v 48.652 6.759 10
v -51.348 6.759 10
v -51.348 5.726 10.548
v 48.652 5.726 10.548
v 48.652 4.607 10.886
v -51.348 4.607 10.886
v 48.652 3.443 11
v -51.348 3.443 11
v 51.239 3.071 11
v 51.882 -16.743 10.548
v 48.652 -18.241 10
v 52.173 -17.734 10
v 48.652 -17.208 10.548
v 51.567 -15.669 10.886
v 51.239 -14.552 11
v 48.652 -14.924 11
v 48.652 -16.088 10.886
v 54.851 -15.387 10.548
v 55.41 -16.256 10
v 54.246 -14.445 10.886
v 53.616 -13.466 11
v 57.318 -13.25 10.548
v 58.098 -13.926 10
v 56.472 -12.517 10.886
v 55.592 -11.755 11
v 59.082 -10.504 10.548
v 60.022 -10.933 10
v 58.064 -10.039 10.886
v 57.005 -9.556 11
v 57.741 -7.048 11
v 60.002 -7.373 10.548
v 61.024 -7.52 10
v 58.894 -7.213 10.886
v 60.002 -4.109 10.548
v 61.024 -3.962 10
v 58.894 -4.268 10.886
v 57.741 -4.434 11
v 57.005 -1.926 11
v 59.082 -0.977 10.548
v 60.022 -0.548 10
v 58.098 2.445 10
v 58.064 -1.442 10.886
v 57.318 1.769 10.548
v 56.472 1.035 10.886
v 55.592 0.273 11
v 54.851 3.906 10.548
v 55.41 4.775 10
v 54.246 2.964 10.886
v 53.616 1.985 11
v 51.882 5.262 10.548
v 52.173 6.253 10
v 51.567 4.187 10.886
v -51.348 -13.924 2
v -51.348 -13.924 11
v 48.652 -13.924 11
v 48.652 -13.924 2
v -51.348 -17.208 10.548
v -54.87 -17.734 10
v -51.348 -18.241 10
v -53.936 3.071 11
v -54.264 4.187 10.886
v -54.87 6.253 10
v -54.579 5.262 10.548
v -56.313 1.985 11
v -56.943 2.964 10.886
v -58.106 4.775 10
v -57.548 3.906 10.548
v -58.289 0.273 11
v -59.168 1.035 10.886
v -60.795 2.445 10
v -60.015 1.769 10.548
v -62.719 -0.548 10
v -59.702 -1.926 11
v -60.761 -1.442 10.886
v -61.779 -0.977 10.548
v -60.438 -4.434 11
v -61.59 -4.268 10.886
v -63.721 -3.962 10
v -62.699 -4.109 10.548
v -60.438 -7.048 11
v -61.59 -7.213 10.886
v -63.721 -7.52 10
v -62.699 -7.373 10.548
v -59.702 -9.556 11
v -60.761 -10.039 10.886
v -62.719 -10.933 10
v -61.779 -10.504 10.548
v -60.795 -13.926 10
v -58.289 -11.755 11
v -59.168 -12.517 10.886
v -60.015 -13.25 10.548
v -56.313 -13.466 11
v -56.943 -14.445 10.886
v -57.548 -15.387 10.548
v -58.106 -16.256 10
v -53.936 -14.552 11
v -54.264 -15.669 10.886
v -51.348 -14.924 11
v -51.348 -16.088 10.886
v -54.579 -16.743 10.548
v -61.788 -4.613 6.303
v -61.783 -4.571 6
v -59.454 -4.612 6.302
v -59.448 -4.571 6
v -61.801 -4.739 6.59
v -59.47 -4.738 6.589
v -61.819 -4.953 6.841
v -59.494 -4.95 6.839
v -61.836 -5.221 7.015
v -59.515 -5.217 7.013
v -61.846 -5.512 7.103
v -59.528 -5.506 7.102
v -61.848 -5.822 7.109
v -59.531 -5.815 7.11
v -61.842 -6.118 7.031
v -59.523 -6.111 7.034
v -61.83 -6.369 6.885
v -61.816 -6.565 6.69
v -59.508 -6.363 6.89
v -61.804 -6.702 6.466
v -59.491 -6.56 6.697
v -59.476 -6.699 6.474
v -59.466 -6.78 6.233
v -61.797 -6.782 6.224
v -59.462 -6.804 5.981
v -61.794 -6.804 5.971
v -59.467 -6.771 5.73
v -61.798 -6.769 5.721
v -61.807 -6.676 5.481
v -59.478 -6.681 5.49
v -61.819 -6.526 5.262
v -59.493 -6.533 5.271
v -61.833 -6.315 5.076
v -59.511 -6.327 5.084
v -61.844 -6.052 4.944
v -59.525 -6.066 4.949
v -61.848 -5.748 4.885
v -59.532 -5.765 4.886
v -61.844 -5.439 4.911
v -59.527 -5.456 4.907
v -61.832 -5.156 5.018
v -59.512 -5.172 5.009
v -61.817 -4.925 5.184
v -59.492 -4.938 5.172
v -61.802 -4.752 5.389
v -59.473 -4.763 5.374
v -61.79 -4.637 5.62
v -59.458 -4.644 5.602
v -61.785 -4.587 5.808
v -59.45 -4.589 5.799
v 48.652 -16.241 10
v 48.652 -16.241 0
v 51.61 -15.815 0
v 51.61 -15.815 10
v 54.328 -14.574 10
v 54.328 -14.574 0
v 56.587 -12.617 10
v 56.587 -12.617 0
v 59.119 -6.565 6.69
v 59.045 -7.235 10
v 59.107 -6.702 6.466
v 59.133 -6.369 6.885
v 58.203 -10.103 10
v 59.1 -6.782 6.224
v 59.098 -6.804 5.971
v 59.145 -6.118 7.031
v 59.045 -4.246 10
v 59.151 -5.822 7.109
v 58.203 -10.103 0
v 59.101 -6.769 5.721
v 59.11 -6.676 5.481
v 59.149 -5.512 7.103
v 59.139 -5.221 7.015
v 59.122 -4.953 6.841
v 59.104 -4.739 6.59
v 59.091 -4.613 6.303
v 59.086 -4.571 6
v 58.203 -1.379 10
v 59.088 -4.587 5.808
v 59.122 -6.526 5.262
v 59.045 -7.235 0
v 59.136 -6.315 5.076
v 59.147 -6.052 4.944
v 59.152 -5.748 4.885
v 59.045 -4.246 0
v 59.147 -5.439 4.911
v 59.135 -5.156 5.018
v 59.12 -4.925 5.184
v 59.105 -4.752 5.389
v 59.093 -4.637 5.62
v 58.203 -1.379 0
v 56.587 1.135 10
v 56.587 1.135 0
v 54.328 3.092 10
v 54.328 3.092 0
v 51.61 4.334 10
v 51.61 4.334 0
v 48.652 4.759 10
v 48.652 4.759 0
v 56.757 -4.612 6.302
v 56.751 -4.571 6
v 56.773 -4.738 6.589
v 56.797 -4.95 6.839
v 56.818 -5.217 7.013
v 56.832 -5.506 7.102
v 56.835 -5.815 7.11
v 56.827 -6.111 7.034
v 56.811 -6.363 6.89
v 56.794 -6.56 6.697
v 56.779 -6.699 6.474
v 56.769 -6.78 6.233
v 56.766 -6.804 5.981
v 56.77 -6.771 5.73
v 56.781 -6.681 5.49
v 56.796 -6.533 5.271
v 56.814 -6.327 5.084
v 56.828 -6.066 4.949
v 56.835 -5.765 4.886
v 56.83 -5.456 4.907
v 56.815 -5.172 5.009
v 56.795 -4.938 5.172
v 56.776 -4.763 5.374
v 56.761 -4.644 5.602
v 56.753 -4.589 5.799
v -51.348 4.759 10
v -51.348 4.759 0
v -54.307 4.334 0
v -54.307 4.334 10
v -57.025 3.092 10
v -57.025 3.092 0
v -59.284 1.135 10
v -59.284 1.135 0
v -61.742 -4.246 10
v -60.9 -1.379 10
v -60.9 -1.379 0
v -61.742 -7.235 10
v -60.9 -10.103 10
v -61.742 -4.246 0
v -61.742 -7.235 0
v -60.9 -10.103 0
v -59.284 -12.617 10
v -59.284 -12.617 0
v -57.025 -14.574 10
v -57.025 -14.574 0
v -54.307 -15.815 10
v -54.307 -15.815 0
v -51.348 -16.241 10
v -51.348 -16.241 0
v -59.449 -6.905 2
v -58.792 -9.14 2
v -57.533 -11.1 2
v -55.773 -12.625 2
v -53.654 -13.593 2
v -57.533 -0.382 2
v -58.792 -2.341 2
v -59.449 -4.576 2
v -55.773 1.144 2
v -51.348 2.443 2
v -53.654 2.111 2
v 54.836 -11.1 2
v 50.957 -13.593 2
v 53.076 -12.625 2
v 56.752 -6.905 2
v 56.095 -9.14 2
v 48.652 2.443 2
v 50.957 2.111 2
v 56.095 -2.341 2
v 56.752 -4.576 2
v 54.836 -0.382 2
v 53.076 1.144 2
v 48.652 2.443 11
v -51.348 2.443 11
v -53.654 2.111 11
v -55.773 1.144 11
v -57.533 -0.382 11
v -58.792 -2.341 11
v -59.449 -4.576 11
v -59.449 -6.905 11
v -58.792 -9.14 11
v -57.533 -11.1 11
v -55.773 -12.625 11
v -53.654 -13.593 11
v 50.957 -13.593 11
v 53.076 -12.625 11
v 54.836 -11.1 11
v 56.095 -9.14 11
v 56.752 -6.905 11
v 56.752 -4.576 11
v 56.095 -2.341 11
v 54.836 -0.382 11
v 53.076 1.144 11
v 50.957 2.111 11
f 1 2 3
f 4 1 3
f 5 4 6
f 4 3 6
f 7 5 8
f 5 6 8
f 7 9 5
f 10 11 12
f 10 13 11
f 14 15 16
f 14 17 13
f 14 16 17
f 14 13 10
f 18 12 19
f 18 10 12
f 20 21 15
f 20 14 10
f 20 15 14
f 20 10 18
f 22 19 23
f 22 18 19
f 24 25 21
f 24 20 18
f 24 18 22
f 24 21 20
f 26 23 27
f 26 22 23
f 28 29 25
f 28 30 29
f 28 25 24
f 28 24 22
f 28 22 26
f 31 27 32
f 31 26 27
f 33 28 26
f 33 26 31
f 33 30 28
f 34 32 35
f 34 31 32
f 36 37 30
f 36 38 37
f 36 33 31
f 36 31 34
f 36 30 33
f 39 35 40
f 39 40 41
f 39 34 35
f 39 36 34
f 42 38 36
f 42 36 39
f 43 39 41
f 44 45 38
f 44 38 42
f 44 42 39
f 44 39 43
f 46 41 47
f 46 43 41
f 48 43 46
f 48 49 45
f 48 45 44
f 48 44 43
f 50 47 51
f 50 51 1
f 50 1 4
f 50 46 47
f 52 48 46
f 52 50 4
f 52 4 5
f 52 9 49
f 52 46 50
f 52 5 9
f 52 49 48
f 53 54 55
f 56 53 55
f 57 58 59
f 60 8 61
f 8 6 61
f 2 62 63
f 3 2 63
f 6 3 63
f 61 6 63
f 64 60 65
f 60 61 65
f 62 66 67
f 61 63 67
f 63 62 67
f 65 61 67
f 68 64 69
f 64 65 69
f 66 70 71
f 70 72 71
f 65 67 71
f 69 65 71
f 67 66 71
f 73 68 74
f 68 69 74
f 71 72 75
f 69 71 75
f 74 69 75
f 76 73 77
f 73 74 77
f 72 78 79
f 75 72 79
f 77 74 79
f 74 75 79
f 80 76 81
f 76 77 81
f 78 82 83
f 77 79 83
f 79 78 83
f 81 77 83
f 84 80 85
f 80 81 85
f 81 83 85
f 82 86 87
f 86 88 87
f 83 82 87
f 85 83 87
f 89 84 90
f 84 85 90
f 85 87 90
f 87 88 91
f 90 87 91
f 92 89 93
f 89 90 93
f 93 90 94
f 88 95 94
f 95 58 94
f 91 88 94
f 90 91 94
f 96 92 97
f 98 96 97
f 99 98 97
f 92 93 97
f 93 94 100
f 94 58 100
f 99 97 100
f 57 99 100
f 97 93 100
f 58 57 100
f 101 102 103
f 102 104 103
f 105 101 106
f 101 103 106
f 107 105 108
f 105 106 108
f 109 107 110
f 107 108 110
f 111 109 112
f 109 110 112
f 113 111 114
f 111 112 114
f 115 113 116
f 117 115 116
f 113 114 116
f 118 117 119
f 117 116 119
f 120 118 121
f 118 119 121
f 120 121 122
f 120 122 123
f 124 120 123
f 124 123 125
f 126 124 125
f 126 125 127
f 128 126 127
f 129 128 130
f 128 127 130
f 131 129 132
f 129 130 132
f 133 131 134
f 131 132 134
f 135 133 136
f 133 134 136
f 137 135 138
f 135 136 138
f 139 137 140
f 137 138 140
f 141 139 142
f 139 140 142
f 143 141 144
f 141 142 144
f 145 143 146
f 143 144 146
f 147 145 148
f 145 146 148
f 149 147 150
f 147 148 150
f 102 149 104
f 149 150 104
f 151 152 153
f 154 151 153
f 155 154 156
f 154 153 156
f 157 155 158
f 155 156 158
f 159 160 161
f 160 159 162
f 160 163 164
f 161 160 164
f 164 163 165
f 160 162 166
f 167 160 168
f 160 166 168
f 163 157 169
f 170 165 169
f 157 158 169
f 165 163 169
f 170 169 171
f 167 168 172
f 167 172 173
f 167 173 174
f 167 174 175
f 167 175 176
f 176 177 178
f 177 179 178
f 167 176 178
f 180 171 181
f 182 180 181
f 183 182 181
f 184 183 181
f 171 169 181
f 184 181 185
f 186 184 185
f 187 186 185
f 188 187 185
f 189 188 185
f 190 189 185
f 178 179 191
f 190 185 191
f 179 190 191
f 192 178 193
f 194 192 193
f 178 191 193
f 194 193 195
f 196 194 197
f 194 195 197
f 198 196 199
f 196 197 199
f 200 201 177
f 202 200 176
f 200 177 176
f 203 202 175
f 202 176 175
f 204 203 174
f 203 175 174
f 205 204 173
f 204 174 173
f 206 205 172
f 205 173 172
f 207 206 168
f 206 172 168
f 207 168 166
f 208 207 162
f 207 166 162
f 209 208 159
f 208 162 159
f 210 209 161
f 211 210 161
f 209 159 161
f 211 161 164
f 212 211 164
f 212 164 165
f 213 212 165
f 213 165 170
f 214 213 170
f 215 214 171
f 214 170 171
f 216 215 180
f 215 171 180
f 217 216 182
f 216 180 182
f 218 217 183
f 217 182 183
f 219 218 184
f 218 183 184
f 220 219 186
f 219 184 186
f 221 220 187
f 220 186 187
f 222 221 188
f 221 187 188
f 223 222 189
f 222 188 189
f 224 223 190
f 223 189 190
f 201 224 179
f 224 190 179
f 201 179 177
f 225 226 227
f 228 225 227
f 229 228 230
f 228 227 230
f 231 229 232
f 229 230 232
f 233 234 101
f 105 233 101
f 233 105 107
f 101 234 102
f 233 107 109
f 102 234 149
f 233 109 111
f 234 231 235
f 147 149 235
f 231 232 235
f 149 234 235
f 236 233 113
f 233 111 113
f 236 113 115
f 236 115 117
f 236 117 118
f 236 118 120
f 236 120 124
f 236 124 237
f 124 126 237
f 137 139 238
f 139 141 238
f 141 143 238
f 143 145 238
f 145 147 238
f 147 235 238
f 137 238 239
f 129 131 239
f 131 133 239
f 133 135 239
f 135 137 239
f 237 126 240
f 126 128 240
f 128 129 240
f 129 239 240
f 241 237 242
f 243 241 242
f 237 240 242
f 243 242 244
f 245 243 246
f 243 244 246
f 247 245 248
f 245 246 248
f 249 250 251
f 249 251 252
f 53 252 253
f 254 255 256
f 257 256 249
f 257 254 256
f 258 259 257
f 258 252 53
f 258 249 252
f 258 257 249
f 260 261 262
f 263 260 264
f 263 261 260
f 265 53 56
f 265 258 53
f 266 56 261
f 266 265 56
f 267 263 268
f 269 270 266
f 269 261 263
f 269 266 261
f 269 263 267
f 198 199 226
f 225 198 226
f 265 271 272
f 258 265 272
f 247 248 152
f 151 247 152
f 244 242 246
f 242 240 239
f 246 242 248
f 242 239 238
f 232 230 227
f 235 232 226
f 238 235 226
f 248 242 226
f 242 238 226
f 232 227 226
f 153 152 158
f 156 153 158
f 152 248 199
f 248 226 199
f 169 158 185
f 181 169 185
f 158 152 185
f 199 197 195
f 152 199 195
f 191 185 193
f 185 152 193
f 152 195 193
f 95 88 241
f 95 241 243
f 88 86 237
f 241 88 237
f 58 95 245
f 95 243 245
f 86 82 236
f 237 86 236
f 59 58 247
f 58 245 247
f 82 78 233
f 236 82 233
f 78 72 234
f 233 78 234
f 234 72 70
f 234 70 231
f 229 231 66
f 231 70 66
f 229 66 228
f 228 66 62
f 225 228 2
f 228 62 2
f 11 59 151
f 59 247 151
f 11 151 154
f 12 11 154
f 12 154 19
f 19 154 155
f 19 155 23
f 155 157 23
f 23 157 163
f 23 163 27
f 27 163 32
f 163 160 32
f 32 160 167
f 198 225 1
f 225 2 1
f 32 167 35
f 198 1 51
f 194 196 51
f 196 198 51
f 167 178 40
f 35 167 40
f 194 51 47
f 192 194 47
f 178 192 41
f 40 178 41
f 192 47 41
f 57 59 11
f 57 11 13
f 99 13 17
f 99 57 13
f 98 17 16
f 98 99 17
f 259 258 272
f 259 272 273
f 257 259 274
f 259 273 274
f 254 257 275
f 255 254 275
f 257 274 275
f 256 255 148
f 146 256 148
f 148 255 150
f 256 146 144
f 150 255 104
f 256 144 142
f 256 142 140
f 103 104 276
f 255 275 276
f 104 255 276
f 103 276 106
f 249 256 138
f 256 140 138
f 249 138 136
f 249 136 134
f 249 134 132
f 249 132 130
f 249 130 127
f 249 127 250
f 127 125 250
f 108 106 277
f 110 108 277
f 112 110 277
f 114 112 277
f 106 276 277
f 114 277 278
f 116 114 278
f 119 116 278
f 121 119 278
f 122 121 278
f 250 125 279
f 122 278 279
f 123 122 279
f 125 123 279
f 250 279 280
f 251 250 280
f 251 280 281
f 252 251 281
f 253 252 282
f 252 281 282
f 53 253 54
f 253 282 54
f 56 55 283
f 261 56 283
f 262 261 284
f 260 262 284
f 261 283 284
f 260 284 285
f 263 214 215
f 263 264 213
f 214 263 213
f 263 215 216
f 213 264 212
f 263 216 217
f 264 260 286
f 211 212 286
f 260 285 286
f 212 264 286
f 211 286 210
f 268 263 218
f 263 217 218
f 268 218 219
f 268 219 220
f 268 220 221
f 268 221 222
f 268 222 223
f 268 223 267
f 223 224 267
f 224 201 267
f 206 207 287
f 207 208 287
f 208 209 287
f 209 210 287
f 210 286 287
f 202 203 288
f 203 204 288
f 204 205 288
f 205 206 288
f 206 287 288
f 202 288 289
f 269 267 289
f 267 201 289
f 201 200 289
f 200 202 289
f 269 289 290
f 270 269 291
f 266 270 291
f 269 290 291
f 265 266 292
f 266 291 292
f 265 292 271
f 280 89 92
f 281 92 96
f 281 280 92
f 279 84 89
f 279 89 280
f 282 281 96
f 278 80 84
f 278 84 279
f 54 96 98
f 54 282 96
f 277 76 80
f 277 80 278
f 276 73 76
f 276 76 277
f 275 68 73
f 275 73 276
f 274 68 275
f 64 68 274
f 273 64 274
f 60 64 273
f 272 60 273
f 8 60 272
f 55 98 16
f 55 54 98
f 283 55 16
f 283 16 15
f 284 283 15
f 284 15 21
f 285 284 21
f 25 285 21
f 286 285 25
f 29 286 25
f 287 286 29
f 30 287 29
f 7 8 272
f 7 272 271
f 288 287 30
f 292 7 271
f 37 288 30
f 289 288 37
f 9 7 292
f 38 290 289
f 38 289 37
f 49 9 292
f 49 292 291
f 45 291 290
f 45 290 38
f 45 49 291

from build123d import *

# Parameters (mm, degrees)
F1_DEPTH    = 10
F3_DEPTH    = 1
F4_T1_DEPTH = 100
F4_T4_ANGLE = 180
F4_T6_ANGLE = 180
F6_DEPTH    = 9
F7_R        = 1.1168399156
F8_DEPTH    = 100


# Not quite as in the source:
# - a fillet or chamfer that OpenCascade refuses, or shapes differently, is made with other operations: its cross-section is extruded or revolved along the edge and cut away or added


with BuildPart() as f1:
    # F0 (on Top) → F1 (new body)
    with BuildSketch(Plane.XY):
        with BuildLine():
            Line((48.6515399069, 4.7592671573), (-51.3484600931, 4.7592671573))
            ThreePointArc((-51.3484600931, 4.7592671573), (-61.8484600931, -5.7407328427), (-51.3484600931, -16.2407328427))
            Line((-51.3484600931, -16.2407328427), (48.6515399069, -16.2407328427))
            ThreePointArc((48.6515399069, -16.2407328427), (59.1515399069, -5.7407328427), (48.6515399069, 4.7592671573))
        make_face()
    extrude(amount=F1_DEPTH)

    # F2 (on face) → F3 (join)
    with BuildSketch(Plane.XY.offset(10)):
        with BuildLine():
            Line((48.6515399069, 6.7592671573), (-51.3484600931, 6.7592671573))
            ThreePointArc((-51.3484600931, 6.7592671573), (-63.8484600931, -5.7407328427), (-51.3484600931, -18.2407328427))
            Line((-51.3484600931, -18.2407328427), (48.6515399069, -18.2407328427))
            ThreePointArc((48.6515399069, -18.2407328427), (61.1515399069, -5.7407328427), (48.6515399069, 6.7592671573))
        make_face()
        with BuildLine():
            Line((-51.3484600931, 4.7592671573), (48.6515399069, 4.7592671573))
            ThreePointArc((48.6515399069, 4.7592671573), (59.1515399069, -5.7407328427), (48.6515399069, -16.2407328427))
            Line((48.6515399069, -16.2407328427), (-51.3484600931, -16.2407328427))
            ThreePointArc((-51.3484600931, -16.2407328427), (-61.8484600931, -5.7407328427), (-51.3484600931, 4.7592671573))
        make_face(mode=Mode.SUBTRACT)
        with BuildLine():
            ThreePointArc((48.6515399069, -16.2407328427), (59.1515399069, -5.7407328427), (48.6515399069, 4.7592671573))
            Line((48.6515399069, 4.7592671573), (-51.3484600931, 4.7592671573))
            ThreePointArc((-51.3484600931, 4.7592671573), (-61.8484600931, -5.7407328427), (-51.3484600931, -16.2407328427))
            Line((-51.3484600931, -16.2407328427), (48.6515399069, -16.2407328427))
        make_face()
    extrude(amount=F3_DEPTH)

    # F4: fillet of radius 6 on 4 edges, made by hand

    # F4_s2 → F4_t1 (cut)
    with BuildSketch(Plane.YZ.offset(-51.3484600931)):
        with BuildLine():
            ThreePointArc((6.7592671573, 10), (5.1746931745, 10.7445626465), (3.4426423669, 11))
            Line((3.4426423669, 11), (6.7592671573, 11))
            Line((6.7592671573, 11), (6.7592671573, 10))
        make_face()
        with BuildLine():
            ThreePointArc((-18.2407328427, 10), (-16.6561588599, 10.7445626465), (-14.9241080524, 11))
            Line((-14.9241080524, 11), (-18.2407328427, 11))
            Line((-18.2407328427, 11), (-18.2407328427, 10))
        make_face()
    extrude(amount=F4_T1_DEPTH, mode=Mode.SUBTRACT)

    # F4_s3 → F4_t4 (revolve, cut)
    with BuildSketch(Plane.YZ.offset(48.6515399069)):
        with BuildLine():
            ThreePointArc((-18.2407328427, 10), (-16.6561588599, 10.7445626465), (-14.9241080524, 11))
            Line((-14.9241080524, 11), (-18.2407328427, 11))
            Line((-18.2407328427, 11), (-18.2407328427, 10))
        make_face()
    revolve(axis=Axis((48.6515399069, -5.7407328427, 11), (0, 0, 1)), revolution_arc=F4_T4_ANGLE, mode=Mode.SUBTRACT)

    # F4_s5 → F4_t6 (revolve, cut)
    with BuildSketch(Plane.YZ.offset(-51.3484600931)):
        with BuildLine():
            ThreePointArc((3.4426423669, 11), (5.1746931745, 10.7445626465), (6.7592671573, 10))
            Line((6.7592671573, 10), (6.7592671573, 11))
            Line((6.7592671573, 11), (3.4426423669, 11))
        make_face()
    revolve(axis=Axis((-51.3484600931, -5.7407328427, 11), (0, 0, 1)), revolution_arc=F4_T6_ANGLE, mode=Mode.SUBTRACT)

    # F5 (on face) → F6 (cut)
    with BuildSketch(Plane.XY.offset(11)):
        with BuildLine():
            Line((48.6515399069, 2.4426423669), (-51.3484600931, 2.4426423669))
            ThreePointArc((-51.3484600931, 2.4426423669), (-59.5318353028, -5.7407328427), (-51.3484600931, -13.9241080524))
            Line((-51.3484600931, -13.9241080524), (48.6515399069, -13.9241080524))
            ThreePointArc((48.6515399069, -13.9241080524), (56.8349151165, -5.7407328427), (48.6515399069, 2.4426423669))
        make_face()
    extrude(amount=-F6_DEPTH, mode=Mode.SUBTRACT)

    # F7 (on Right) → F8 (cut, symmetric)
    with BuildSketch(Plane.YZ):
        with Locations((-5.6874994189, 6)):
            Circle(F7_R)
    extrude(amount=F8_DEPTH, both=True, mode=Mode.SUBTRACT)


solid = f1.part
